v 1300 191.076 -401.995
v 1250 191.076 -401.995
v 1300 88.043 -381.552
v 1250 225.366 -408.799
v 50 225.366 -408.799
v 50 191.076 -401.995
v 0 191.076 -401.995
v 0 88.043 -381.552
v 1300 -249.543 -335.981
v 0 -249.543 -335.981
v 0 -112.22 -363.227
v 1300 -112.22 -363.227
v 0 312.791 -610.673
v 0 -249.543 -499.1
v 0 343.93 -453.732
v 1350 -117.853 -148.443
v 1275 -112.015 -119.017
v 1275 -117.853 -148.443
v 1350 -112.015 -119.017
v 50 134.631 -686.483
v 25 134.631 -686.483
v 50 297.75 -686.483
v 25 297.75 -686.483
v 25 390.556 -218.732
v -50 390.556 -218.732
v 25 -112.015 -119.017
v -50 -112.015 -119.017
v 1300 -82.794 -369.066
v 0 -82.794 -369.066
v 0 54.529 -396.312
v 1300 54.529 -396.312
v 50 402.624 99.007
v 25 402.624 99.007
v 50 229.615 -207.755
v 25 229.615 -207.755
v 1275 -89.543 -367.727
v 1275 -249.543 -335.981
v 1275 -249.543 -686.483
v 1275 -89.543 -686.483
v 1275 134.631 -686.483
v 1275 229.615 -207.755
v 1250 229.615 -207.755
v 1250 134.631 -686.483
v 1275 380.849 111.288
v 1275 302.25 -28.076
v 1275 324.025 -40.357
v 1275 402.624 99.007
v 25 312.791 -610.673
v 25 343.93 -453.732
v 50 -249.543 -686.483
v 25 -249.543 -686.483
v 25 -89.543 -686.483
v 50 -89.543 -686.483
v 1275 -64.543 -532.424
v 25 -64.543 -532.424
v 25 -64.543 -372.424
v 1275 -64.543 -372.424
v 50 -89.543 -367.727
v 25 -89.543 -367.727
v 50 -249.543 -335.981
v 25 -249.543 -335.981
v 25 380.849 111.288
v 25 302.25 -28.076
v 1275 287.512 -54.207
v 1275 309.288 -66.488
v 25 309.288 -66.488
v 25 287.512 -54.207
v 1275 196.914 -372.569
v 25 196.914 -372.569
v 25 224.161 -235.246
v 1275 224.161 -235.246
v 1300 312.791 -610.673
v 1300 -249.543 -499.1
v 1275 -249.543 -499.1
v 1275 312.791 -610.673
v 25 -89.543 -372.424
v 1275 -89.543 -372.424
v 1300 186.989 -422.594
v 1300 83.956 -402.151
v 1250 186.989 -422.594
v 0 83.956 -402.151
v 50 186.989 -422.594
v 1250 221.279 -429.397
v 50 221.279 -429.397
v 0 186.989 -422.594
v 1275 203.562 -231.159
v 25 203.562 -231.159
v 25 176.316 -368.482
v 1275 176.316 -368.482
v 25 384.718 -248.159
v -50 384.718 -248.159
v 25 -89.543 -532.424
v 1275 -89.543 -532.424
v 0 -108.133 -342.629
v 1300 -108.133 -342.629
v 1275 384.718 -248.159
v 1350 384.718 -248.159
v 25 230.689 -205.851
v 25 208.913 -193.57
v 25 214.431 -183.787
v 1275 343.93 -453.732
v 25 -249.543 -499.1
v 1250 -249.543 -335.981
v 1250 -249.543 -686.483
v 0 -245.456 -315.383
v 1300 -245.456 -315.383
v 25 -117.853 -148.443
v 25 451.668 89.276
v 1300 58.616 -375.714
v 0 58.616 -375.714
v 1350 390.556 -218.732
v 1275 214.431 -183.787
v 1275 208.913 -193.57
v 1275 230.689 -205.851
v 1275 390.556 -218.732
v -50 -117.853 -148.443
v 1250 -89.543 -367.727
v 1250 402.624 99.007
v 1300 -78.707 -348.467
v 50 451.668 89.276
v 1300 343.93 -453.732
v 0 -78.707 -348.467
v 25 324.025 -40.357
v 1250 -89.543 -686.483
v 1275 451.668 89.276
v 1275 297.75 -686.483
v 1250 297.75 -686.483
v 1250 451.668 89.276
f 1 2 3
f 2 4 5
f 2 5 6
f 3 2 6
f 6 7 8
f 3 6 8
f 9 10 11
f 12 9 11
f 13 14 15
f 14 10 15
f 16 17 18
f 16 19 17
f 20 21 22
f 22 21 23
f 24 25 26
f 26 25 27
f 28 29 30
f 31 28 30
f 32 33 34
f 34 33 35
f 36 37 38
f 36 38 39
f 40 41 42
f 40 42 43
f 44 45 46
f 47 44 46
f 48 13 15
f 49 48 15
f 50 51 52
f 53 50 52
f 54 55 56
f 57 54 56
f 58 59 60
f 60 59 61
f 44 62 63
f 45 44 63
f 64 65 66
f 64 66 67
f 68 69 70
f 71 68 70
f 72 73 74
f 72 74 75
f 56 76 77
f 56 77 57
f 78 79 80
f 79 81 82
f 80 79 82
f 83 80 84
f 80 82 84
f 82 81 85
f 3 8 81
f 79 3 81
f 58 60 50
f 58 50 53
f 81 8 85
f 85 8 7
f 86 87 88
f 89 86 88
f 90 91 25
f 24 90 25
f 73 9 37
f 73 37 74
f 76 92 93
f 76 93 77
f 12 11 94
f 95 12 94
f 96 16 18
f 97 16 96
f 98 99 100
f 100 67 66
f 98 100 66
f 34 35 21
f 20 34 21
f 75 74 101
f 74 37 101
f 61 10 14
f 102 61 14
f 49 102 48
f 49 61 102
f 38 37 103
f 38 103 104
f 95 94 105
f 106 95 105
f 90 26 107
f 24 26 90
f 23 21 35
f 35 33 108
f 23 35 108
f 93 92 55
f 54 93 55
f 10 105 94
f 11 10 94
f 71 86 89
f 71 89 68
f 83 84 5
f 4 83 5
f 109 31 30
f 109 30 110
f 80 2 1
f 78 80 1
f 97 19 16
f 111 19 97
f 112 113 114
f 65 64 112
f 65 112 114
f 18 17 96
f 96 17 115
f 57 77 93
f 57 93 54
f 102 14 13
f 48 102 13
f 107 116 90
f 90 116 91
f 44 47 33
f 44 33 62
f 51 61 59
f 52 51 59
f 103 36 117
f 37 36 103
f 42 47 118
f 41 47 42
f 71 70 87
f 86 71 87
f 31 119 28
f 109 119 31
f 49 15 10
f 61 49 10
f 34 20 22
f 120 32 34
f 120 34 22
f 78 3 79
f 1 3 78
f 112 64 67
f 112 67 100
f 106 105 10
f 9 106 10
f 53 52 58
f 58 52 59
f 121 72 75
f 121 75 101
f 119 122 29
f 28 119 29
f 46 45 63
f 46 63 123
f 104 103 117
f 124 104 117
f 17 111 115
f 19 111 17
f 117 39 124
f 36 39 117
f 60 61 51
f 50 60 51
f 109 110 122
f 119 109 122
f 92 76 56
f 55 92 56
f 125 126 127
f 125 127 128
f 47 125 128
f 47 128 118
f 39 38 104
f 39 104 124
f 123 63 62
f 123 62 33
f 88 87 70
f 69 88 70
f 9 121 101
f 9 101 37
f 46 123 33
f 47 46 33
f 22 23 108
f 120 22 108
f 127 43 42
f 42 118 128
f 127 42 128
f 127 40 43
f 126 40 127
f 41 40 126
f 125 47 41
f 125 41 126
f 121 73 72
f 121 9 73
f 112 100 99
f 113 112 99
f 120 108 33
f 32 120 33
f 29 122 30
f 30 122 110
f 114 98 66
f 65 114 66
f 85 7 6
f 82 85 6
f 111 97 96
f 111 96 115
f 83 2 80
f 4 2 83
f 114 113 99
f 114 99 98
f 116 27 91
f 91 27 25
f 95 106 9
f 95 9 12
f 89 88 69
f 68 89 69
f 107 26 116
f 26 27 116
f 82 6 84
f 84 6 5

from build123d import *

# Parameters (mm, degrees)
F2_DEPTH       = 1300
F4_DEPTH       = 1300
F6_DEPTH       = 1300
F8_START       = 25
F8_DEPTH       = 1250
F9_START       = 25
F9_DEPTH       = 1250
F10_START      = 25
F10_DEPTH      = 1250
F12_DEPTH      = 25
F14_DEPTH      = 50
F14_DEPTH_BACK = 25
F16_START      = 25
F16_DEPTH      = 25
F18_START      = 25
F18_DEPTH      = 25
F20_START      = 25
F19_W          = 25
F19_H          = 160
F20_DEPTH      = 1250
F24_W          = 89.8274511099
F24_H          = 184.4890600207
F24_W_2        = 136.3316774368
F24_H_2        = 224.5015686514
F25_DEPTH      = 389.8007907773


with BuildPart() as f2:
    # F1 (on Right) → F2 (new body)
    with BuildSketch(Plane.YZ):
        Polygon((-108.1331925128, -342.6288606187), (-245.456303894, -315.3825199362), (-249.5432549964, -335.9809866434), (-112.2201436151, -363.2273273258), align=None)
    extrude(amount=F2_DEPTH)


with BuildPart() as f4:
    # F3 (on Right) → F4 (new body)
    with BuildSketch(Plane.YZ):
        Polygon((-78.7068115025, -348.4673621935), (-82.7937626049, -369.0658289006), (54.5293487763, -396.312169583), (58.6162998787, -375.7137028759), align=None)
    extrude(amount=F4_DEPTH)


with BuildPart() as f6:
    # F5 (on Right) → F6 (new body)
    with BuildSketch(Plane.YZ):
        Polygon((225.3657922702, -408.7985451331), (88.042680889, -381.5522044507), (83.9557297866, -402.1506711578), (221.2788411678, -429.3970118403), align=None)
    extrude(amount=F6_DEPTH)

    # F24 (on offset) → F25 (cut, through all)
    with BuildSketch(Plane(origin=(0, -64.6365148408, -325.7717221639), x_dir=(1, 0, 0), z_dir=(0, 0.1946167192, 0.980879367))):
        with Locations((5.0862744451, 357.9018768786)):
            Rectangle(F24_W, F24_H)
        with Locations((1318.1658387184, 377.908131194)):
            Rectangle(F24_W_2, F24_H_2)
    extrude(amount=-F25_DEPTH, mode=Mode.SUBTRACT)


with BuildPart() as f8:
    # F7 (on Right) → F8 (new body)
    with BuildSketch(Plane.YZ.offset(F8_START)):
        Polygon((196.9143789924, -372.5686865971), (224.1607196748, -235.2455752159), (203.5622529677, -231.1586241135), (176.3159122852, -368.4817354947), align=None)
    extrude(amount=F8_DEPTH)


with BuildPart() as f9:
    # F0 (on Right) → F9 (new body)
    with BuildSketch(Plane.YZ.offset(F9_START)):
        Polygon((214.4308745378, -183.7871273715), (240.2442488743, -188.9087706569), (309.2878805275, -66.4876683337), (287.5123208411, -54.2065853055), align=None)
        Polygon((230.6889491473, -205.8512503266), (240.2442488743, -188.9087706569), (214.4308745378, -183.7871273715), (208.9133894609, -193.5701672984), align=None)
    extrude(amount=F9_DEPTH)


with BuildPart() as f10:
    # F0 (on Right) → F10 (new body)
    with BuildSketch(Plane.YZ.offset(F10_START)):
        Polygon((324.0251801613, -40.35699671), (402.6241115415, 99.0065852829), (380.8485518551, 111.287668311), (302.2496204749, -28.0759136819), align=None)
    extrude(amount=F10_DEPTH)


with BuildPart() as f12:
    # F11 (on Right) → F12 (new body)
    with BuildSketch(Plane.YZ):
        Polygon((-249.5432549964, -499.0999239781), (312.790949971, -610.6729081015), (343.9296250367, -453.7322093802), (-249.5432549964, -335.9809866434), align=None)
    extrude(amount=F12_DEPTH)


with BuildPart() as f14:
    # F13 (on Right) → F14 (new body, two sides)
    with BuildSketch(Plane.YZ) as f14_sk:
        Polygon((384.7175798243, -248.1585903904), (390.5560813991, -218.7322093802), (-112.0149452349, -119.0168645191), (-117.8534468097, -148.4432455293), align=None)
    extrude(amount=-F14_DEPTH)
    extrude(f14_sk.sketch, amount=F14_DEPTH_BACK)


with BuildPart() as f16:
    # F15 (on Right) → F16 (new body)
    with BuildSketch(Plane.YZ.offset(F16_START)):
        Polygon((-249.5432549964, -335.9809866434), (-249.5432549964, -686.4825899402), (-89.5432549964, -686.4825899402), (-89.5432549964, -367.7266590604), align=None)
    extrude(amount=F16_DEPTH)


with BuildPart() as f18:
    # F17 (on Right) → F18 (new body)
    with BuildSketch(Plane.YZ.offset(F18_START)):
        Polygon((134.6305793508, -686.4825899402), (297.7495166855, -686.4825899402), (451.668079892, 89.2757493249), (402.6241115415, 99.0065852829), (229.6150686164, -207.7553453924), align=None)
    extrude(amount=F18_DEPTH)


with BuildPart() as f20:
    # F19 (on Right) → F20 (new body)
    with BuildSketch(Plane.YZ.offset(F20_START)):
        with Locations((-77.0432549964, -452.4240958691)):
            Rectangle(F19_W, F19_H)
    extrude(amount=F20_DEPTH)


with BuildPart() as f22_1:
    # F22: instance of F18
    add(f18.part.mirror(Plane.YZ.offset(650)))


with BuildPart() as f22_2:
    # F22: instance of F16
    add(f16.part.mirror(Plane.YZ.offset(650)))


with BuildPart() as f22_3:
    # F22: instance of F12
    add(f12.part.mirror(Plane.YZ.offset(650)))


with BuildPart() as f22_4:
    # F22: instance of F14
    add(f14.part.mirror(Plane.YZ.offset(650)))


solid = Compound([f2.part, f4.part, f6.part, f8.part, f9.part, f10.part, f12.part, f14.part, f16.part, f18.part, f20.part, f22_1.part, f22_2.part, f22_3.part, f22_4.part])
